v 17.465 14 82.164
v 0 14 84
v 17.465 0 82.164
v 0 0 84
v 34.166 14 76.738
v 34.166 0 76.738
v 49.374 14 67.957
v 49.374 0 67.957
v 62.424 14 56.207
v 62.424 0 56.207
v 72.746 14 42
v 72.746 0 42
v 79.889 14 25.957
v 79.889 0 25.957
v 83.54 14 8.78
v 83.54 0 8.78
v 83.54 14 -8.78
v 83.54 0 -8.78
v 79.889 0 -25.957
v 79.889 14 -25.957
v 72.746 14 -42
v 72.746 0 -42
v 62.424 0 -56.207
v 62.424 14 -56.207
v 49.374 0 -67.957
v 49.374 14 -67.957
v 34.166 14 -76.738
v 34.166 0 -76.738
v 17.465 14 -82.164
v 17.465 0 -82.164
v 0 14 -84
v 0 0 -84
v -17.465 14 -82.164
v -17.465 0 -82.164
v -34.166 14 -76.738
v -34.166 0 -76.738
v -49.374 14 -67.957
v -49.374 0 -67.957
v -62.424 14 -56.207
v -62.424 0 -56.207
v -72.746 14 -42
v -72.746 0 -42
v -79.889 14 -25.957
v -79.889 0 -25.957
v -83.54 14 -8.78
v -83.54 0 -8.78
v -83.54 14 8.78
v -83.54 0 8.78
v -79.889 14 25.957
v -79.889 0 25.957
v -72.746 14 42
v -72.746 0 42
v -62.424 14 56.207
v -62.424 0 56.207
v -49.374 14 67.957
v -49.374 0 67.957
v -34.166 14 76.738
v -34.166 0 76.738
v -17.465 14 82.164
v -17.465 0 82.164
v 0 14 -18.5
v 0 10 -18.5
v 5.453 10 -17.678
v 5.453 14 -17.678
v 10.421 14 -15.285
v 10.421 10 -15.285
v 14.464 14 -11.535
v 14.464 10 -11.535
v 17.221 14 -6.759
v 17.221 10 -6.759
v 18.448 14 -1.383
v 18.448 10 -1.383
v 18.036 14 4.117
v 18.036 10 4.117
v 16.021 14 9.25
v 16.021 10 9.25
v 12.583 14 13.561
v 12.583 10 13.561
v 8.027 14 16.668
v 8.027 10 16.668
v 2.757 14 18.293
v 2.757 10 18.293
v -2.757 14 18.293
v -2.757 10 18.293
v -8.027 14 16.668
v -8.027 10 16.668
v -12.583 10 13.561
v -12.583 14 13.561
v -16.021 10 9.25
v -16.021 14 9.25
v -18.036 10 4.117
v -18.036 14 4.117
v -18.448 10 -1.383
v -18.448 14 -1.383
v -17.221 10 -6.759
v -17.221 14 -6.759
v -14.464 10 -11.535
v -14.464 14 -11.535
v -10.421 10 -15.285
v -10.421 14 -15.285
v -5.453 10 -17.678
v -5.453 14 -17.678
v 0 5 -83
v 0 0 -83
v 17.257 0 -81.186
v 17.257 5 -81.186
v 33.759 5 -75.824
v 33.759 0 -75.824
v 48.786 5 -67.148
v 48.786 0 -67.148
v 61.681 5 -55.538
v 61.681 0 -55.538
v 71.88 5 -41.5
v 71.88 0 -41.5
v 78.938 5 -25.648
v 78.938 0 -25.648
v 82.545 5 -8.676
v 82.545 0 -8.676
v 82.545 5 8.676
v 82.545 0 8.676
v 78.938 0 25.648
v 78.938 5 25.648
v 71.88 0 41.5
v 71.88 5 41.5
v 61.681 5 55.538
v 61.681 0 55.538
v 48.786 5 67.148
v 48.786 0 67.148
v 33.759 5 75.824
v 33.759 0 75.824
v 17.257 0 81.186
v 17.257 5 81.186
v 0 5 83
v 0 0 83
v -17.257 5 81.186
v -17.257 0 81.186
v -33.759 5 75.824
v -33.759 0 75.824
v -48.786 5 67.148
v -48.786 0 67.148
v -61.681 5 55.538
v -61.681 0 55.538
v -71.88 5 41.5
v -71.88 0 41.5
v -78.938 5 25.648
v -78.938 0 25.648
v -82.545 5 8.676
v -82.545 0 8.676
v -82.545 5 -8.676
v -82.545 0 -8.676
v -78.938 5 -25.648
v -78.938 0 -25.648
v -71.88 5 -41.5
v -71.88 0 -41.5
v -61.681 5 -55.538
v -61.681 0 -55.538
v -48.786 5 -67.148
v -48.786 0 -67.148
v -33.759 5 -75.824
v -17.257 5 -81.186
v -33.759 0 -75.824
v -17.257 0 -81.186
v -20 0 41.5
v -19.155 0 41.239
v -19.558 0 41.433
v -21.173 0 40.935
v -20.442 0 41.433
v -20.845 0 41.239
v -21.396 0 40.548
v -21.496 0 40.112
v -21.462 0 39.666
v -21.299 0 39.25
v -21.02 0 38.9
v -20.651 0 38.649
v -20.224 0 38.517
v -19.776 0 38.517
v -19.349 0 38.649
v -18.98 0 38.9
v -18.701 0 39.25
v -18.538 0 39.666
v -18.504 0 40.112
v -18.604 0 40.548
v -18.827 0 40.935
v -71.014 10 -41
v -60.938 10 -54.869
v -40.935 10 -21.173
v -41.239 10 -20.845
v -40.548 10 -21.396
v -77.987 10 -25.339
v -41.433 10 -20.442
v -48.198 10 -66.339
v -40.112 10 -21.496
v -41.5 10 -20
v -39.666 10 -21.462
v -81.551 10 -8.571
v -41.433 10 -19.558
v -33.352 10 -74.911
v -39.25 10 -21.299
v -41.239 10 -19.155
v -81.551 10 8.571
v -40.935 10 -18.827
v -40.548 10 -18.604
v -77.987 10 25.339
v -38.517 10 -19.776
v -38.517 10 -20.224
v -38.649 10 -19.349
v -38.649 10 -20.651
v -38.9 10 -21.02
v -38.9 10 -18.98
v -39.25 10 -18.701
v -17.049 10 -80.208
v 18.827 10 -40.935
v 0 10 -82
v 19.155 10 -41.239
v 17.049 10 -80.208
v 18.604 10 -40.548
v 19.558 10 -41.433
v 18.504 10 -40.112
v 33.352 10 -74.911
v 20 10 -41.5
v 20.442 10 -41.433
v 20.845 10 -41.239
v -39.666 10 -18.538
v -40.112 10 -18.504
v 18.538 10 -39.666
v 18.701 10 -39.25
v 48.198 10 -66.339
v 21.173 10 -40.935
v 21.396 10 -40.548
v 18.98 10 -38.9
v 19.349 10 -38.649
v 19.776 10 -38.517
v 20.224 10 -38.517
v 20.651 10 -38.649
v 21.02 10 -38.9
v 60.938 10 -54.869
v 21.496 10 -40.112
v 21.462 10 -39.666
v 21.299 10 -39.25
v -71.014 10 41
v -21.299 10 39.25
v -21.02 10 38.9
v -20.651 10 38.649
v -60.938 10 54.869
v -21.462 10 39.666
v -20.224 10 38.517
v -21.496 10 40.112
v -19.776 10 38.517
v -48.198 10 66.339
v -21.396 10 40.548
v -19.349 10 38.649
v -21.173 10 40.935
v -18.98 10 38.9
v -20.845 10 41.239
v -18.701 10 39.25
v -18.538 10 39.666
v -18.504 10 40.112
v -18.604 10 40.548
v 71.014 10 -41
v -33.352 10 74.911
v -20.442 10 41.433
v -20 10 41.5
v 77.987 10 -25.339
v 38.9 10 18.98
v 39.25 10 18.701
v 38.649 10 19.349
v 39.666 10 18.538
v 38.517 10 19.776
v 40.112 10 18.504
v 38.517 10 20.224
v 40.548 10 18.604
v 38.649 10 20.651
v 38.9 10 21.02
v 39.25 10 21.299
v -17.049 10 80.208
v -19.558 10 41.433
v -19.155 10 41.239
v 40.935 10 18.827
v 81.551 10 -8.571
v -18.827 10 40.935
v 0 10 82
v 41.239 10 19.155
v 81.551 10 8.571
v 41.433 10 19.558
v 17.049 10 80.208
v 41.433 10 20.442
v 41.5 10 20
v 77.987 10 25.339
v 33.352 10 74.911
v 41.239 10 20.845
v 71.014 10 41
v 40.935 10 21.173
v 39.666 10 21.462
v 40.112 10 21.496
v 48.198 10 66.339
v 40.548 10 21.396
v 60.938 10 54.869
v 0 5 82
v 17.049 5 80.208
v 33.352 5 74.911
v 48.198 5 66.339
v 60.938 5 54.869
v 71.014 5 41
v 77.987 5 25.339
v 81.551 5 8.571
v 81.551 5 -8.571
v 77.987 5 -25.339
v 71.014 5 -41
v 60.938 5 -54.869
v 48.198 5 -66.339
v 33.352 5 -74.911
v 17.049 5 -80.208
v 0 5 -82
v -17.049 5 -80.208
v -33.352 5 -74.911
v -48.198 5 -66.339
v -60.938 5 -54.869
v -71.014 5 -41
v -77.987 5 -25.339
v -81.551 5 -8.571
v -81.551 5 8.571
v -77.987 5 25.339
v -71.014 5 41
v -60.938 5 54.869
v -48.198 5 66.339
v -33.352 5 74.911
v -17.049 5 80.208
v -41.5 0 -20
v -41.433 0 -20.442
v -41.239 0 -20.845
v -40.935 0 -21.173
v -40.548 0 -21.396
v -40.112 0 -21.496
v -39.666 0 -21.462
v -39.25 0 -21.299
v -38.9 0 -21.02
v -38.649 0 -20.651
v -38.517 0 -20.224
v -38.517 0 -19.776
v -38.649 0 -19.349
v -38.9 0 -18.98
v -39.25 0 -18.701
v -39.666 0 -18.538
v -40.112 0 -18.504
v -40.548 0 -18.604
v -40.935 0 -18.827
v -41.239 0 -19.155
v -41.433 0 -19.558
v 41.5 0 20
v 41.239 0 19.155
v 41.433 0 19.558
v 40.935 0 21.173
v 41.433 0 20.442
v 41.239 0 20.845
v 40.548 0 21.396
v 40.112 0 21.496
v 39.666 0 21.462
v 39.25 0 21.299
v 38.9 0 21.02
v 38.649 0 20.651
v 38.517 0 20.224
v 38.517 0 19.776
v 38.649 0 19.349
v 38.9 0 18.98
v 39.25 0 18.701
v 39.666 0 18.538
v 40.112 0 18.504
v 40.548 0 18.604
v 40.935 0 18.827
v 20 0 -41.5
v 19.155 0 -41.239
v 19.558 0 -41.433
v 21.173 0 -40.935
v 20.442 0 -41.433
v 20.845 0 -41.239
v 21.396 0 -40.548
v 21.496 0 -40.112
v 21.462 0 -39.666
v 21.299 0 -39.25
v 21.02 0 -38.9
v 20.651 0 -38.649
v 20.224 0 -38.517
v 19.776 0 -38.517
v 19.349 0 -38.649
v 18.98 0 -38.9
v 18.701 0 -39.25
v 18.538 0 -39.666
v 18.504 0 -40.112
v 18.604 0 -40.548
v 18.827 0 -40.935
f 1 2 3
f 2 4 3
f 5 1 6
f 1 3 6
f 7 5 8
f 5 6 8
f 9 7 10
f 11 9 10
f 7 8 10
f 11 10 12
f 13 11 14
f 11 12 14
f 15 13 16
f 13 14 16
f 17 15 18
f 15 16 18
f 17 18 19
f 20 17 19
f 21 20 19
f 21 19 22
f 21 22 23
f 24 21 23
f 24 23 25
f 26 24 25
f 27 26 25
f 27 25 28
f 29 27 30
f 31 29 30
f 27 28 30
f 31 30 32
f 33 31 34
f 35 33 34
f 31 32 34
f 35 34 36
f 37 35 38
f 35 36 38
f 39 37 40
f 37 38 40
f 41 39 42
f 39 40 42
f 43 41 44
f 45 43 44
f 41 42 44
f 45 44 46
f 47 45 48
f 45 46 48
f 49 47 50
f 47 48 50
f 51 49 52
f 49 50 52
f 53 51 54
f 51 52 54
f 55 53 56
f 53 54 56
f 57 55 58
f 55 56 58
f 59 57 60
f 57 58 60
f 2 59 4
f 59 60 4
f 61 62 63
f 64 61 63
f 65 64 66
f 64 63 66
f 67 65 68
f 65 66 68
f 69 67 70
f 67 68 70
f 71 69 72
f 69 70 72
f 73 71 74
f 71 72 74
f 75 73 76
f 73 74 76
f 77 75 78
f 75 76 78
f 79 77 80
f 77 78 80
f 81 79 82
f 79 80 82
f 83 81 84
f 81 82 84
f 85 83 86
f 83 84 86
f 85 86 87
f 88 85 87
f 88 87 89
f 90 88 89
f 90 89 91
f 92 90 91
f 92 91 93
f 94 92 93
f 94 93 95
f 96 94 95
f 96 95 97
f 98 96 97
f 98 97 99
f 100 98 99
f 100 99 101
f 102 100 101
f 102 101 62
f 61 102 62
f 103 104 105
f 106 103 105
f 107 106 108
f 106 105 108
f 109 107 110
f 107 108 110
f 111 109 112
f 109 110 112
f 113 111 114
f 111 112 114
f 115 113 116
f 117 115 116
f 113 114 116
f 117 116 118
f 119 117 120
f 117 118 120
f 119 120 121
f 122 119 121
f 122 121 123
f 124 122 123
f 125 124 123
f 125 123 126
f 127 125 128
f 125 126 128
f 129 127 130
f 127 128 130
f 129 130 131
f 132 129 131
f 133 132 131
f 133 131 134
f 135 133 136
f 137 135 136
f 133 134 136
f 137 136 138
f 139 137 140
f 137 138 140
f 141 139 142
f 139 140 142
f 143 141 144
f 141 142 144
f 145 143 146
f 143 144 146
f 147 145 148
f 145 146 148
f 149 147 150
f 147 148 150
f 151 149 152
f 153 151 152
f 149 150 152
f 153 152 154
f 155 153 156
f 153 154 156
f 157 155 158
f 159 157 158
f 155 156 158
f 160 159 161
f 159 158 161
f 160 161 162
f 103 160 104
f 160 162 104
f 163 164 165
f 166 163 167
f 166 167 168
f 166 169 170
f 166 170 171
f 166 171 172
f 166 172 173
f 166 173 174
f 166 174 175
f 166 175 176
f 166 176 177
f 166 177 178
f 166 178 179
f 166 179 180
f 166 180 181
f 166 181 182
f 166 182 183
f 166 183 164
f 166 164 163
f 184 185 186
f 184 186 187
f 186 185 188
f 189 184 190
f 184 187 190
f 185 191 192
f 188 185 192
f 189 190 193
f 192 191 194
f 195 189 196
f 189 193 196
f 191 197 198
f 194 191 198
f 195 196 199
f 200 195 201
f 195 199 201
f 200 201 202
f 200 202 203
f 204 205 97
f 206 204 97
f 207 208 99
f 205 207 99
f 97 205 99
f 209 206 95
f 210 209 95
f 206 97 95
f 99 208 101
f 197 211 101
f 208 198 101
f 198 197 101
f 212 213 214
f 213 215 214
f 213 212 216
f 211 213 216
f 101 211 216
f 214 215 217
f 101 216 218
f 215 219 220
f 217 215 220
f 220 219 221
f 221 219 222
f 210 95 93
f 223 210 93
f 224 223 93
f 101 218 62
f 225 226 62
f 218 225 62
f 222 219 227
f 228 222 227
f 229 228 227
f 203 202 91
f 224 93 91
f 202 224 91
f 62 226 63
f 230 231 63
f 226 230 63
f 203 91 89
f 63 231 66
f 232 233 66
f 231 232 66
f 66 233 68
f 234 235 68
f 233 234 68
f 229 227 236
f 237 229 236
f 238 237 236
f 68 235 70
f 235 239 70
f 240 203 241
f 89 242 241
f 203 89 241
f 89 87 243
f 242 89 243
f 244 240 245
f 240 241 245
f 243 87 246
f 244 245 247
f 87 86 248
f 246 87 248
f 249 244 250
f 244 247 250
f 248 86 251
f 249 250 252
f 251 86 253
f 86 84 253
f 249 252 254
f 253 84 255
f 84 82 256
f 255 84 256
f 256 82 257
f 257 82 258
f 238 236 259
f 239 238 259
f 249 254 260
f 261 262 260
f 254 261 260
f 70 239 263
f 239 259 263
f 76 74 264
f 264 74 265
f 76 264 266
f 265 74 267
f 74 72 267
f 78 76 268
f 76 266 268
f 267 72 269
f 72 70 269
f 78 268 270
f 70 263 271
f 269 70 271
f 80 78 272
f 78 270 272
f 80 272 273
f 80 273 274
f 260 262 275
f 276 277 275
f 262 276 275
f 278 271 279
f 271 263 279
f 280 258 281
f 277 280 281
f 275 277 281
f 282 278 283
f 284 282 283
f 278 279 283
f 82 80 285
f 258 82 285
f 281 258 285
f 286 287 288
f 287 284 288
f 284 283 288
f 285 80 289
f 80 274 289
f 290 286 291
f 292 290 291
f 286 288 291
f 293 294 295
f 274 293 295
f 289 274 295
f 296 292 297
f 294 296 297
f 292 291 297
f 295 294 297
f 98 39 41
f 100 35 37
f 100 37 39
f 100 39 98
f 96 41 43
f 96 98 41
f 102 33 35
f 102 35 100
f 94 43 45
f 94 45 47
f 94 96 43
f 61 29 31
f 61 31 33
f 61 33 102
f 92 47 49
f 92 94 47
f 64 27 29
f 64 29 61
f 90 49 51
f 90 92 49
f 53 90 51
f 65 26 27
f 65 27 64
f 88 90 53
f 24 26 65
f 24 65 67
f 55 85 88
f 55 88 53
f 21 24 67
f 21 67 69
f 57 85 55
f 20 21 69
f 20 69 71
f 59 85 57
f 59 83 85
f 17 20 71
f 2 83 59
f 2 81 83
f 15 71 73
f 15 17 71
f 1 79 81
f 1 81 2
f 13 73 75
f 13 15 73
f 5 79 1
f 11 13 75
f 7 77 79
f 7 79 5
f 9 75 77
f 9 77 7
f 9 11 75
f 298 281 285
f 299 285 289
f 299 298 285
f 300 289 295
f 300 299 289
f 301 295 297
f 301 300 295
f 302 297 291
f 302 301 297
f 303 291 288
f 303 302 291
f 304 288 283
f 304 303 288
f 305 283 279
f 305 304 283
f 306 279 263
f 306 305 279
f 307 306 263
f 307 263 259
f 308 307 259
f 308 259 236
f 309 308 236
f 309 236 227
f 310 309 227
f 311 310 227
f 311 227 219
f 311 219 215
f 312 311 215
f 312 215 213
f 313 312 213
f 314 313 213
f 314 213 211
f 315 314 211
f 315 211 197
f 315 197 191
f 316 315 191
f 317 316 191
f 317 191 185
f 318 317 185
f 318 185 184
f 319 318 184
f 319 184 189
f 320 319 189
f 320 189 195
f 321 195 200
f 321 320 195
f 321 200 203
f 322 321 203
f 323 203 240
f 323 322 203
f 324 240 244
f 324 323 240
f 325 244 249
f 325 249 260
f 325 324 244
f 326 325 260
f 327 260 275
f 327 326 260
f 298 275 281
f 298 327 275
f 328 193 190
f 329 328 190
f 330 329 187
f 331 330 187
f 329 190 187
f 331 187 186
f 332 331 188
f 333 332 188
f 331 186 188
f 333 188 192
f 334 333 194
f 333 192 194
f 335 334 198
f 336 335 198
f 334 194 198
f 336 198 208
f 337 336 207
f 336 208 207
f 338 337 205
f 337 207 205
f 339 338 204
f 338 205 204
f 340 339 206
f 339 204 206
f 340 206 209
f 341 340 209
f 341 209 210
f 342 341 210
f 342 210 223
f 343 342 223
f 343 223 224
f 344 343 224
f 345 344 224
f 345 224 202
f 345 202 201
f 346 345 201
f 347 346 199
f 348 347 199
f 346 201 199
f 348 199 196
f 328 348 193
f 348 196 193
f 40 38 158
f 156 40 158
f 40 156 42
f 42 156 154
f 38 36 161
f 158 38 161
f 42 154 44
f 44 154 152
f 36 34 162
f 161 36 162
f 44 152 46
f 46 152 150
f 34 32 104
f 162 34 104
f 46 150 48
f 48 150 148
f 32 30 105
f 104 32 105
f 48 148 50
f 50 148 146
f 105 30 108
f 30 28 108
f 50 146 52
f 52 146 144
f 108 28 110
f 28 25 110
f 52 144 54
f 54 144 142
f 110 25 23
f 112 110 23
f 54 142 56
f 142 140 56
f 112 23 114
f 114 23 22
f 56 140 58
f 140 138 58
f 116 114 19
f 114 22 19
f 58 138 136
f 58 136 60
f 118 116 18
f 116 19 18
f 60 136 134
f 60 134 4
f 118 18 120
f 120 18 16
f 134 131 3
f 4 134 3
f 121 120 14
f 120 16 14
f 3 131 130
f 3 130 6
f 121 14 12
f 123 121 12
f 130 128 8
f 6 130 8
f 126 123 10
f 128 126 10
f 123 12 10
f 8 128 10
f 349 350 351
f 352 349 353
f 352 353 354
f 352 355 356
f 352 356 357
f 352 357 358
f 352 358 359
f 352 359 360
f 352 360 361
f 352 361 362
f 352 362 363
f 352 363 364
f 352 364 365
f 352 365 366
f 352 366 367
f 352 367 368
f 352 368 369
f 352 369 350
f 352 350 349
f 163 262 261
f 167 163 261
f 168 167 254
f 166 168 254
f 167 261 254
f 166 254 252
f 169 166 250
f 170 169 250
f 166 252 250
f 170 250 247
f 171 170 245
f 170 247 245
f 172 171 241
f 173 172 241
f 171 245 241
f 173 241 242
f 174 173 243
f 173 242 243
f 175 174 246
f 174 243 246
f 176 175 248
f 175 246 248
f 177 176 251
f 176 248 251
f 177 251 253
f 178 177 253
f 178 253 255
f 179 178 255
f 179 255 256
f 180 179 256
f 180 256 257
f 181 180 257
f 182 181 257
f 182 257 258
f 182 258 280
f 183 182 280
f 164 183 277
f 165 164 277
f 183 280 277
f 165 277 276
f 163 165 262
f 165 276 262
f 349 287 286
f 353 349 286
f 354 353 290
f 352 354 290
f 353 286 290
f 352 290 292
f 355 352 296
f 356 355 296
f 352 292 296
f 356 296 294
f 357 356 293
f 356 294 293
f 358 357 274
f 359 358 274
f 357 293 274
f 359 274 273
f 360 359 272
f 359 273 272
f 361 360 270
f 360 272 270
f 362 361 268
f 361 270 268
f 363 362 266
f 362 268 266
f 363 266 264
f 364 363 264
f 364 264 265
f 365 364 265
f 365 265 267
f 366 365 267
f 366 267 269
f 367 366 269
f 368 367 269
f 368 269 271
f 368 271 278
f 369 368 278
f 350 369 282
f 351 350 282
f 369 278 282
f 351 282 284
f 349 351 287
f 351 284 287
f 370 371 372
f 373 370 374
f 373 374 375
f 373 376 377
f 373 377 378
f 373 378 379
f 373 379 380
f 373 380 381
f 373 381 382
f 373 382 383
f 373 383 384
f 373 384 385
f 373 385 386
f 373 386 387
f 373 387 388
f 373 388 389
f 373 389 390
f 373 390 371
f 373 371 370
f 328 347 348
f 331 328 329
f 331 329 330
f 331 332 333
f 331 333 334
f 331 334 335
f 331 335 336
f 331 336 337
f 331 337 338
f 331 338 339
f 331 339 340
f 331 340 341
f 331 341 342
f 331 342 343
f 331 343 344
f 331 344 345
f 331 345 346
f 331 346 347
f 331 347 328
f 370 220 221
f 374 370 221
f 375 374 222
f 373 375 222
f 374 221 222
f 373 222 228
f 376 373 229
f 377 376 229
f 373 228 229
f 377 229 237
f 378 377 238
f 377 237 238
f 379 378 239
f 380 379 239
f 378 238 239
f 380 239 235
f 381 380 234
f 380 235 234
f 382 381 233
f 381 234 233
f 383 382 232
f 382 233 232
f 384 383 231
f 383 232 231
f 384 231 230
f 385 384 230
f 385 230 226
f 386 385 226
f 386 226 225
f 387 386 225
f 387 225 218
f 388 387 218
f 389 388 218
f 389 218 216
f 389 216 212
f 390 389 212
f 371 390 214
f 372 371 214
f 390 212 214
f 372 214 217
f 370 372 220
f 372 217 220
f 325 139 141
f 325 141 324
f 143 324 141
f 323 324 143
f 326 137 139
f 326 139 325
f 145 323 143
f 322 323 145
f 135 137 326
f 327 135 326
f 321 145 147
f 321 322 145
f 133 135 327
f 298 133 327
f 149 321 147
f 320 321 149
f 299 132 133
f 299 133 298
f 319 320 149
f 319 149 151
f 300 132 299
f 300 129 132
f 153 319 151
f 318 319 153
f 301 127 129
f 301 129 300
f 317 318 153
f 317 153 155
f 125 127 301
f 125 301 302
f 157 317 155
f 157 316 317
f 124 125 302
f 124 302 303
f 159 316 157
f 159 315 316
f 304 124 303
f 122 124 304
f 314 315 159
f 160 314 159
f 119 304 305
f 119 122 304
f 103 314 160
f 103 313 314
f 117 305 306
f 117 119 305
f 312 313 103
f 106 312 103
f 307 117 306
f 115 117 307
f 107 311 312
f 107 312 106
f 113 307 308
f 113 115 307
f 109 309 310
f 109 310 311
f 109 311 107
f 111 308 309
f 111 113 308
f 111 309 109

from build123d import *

# Parameters (mm, degrees)
CROQUIS1_R              = 84
CROQUIS1_R_2            = 82
SALIENTE_EXTRUIR1_DEPTH = 10
CROQUIS2_R              = 84
SALIENTE_EXTRUIR2_DEPTH = 4
CROQUIS3_R              = 1.5
SALIENTE_EXTRUIR3_DEPTH = 10
MATRIZC1_COUNT          = 4
CROQUIS15_R             = 83
CROQUIS15_R_2           = 82
CORTAR_EXTRUIR1_DEPTH   = 5
CROQUIS16_R             = 18.5
CORTAR_EXTRUIR2_DEPTH   = 13


with BuildPart() as part:
    # Croquis1 → Saliente-Extruir1 (new body)
    with BuildSketch(Plane(origin=(0, 0, 0), x_dir=(1, 0, 0), z_dir=(0, 1, 0))):
        Circle(CROQUIS1_R)
        Circle(CROQUIS1_R_2, mode=Mode.SUBTRACT)
    extrude(amount=SALIENTE_EXTRUIR1_DEPTH)

    # Croquis2 → Saliente-Extruir2 (add)
    with BuildSketch(Plane(origin=(0, 10, 0), x_dir=(1, 0, 0), z_dir=(0, 1, 0))):
        Circle(CROQUIS2_R)
    extrude(amount=SALIENTE_EXTRUIR2_DEPTH)

    # Croquis3 → Saliente-Extruir3 (add)
    with BuildSketch(Plane.XZ.offset(-10)):
        with Locations((-20, 40)):
            Circle(CROQUIS3_R)
    saliente_extruir3 = extrude(amount=SALIENTE_EXTRUIR3_DEPTH)

    # MatrizC1: Saliente-Extruir3 ×4 about axis
    matrizc1_axis = Axis((0, -0.7, 0), (0, 1, 0))
    for i in range(1, MATRIZC1_COUNT):
        add(saliente_extruir3.rotate(matrizc1_axis, i * 360 / MATRIZC1_COUNT))

    # Croquis15 → Cortar-Extruir1 (cut)
    with BuildSketch(Plane.XZ):
        Circle(CROQUIS15_R)
        Circle(CROQUIS15_R_2, mode=Mode.SUBTRACT)
    extrude(amount=-CORTAR_EXTRUIR1_DEPTH, mode=Mode.SUBTRACT)

    # Croquis16 → Cortar-Extruir2 (cut)
    with BuildSketch(Plane.XZ.offset(-10)):
        Circle(CROQUIS16_R)
    extrude(amount=-CORTAR_EXTRUIR2_DEPTH, mode=Mode.SUBTRACT)


solid = part.part
